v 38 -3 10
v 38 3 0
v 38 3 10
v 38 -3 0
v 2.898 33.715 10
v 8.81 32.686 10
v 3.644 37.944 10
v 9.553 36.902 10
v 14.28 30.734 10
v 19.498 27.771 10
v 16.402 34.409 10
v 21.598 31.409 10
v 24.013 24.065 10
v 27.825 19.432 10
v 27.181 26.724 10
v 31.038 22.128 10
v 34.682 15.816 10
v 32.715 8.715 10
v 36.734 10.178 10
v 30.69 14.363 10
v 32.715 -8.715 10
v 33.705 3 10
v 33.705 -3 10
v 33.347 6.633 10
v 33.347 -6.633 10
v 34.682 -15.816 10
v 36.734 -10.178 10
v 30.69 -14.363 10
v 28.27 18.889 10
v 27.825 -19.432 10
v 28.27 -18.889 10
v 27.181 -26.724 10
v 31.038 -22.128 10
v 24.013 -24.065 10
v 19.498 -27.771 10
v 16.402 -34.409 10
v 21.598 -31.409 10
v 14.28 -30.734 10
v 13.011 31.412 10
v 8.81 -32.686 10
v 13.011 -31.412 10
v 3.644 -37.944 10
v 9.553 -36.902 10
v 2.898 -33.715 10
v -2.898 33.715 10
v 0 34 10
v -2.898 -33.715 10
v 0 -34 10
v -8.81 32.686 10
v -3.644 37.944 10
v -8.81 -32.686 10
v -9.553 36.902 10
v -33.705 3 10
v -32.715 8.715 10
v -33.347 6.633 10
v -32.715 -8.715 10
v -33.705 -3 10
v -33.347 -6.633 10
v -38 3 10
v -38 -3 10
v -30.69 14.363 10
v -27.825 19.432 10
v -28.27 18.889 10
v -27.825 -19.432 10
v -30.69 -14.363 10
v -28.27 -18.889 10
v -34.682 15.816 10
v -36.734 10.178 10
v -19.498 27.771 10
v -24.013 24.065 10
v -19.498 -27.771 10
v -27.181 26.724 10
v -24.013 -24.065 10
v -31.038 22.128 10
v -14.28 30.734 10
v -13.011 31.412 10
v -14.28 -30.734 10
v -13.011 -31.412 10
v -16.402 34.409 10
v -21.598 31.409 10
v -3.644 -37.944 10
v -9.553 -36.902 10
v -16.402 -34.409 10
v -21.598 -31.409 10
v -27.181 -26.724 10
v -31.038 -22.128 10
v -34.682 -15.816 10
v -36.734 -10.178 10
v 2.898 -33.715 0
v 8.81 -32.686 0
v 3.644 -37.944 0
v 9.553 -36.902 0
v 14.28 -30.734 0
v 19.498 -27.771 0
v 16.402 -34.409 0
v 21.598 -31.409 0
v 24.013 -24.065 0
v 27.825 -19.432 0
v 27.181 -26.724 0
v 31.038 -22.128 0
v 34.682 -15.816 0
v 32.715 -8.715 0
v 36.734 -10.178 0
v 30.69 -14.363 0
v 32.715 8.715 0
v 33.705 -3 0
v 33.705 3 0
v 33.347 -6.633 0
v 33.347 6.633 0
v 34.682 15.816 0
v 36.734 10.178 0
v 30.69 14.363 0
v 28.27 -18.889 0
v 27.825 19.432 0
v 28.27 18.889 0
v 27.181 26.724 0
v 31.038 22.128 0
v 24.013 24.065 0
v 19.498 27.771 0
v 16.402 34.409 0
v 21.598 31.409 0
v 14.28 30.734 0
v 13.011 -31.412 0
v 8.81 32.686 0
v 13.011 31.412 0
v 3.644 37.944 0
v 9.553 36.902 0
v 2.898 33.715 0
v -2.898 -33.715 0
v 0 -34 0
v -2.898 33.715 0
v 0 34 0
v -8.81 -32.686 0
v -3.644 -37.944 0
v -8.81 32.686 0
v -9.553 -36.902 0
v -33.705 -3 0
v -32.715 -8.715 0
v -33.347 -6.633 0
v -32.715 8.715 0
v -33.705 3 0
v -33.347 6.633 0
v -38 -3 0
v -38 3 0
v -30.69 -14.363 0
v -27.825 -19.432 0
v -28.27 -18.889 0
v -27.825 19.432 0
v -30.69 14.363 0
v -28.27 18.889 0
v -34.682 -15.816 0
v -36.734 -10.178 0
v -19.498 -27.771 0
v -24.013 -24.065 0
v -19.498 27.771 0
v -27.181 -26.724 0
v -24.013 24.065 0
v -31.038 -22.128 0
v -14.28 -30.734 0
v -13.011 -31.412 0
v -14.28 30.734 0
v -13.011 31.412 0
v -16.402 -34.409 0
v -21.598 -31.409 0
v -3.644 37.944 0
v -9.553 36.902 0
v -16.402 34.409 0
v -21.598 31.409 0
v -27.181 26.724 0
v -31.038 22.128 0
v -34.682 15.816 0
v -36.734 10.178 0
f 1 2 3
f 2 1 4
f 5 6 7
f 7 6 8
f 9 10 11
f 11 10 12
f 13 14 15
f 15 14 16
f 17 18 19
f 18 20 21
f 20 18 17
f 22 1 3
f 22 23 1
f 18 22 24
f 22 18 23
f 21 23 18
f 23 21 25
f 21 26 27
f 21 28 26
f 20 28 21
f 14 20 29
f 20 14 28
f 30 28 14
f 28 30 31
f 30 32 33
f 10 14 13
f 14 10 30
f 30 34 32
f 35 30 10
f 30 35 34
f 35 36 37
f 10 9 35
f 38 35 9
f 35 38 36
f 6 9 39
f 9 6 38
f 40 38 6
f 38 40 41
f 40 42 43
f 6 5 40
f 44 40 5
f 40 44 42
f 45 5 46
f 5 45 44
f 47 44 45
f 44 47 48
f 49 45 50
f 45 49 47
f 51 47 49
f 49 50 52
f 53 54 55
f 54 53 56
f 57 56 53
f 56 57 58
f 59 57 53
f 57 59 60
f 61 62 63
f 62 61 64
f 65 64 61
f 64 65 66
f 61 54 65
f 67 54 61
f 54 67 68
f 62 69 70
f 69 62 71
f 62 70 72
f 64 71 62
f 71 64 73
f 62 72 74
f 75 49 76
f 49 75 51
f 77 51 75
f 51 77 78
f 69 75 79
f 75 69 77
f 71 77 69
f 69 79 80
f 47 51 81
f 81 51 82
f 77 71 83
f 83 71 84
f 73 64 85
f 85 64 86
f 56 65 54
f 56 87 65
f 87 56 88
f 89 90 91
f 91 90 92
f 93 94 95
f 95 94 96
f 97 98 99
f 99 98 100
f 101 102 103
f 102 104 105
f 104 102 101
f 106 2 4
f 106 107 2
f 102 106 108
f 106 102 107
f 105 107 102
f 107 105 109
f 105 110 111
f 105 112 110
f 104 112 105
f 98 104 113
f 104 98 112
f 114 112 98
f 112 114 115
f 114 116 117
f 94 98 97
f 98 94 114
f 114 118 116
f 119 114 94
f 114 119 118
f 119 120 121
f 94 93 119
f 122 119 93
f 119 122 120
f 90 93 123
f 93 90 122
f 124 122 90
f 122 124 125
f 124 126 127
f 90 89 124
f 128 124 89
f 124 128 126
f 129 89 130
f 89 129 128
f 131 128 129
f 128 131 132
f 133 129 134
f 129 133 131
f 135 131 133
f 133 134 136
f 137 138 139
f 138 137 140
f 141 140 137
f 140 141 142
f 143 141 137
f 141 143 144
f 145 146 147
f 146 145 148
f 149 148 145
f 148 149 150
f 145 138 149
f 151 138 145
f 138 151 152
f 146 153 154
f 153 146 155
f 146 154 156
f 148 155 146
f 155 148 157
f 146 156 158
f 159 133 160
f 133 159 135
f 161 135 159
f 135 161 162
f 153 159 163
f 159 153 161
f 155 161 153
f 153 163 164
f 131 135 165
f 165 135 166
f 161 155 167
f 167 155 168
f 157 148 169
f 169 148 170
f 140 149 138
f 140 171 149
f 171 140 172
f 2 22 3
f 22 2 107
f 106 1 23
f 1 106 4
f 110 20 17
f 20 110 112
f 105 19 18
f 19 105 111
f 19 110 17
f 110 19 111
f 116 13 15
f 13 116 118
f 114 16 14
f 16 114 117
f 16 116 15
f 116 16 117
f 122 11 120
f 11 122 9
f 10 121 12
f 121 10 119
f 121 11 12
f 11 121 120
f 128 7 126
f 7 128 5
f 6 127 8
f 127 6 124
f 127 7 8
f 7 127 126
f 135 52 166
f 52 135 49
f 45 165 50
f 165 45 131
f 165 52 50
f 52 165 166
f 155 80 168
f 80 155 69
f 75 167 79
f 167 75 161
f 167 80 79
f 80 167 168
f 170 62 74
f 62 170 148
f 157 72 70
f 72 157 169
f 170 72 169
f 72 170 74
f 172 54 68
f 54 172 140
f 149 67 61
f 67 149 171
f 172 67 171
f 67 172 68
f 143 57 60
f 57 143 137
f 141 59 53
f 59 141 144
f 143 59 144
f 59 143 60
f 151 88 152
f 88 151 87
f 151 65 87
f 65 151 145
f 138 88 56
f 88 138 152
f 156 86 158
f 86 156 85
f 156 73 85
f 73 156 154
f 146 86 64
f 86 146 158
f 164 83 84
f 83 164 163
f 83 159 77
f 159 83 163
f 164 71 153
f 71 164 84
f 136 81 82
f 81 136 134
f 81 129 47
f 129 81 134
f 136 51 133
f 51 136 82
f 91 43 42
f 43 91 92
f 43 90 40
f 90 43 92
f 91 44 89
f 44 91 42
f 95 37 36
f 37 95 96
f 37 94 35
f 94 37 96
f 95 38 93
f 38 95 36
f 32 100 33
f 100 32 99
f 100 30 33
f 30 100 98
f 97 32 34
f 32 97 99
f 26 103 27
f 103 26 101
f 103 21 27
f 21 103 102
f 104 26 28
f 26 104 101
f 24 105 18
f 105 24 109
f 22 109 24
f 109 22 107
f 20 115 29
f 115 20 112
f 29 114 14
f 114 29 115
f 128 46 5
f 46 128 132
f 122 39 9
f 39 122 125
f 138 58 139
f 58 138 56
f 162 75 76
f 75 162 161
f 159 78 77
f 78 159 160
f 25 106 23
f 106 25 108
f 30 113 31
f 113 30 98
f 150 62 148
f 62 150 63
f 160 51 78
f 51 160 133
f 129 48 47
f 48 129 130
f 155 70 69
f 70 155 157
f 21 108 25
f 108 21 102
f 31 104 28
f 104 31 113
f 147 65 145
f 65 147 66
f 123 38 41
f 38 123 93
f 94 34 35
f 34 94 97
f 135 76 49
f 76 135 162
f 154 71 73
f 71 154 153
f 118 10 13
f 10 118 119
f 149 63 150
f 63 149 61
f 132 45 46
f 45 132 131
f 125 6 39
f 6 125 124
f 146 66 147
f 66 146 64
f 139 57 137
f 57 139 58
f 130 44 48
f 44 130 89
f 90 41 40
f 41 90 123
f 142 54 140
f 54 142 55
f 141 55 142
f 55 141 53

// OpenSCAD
$fn = 32;

// ----------------------------------------------------------------------
// Spur blank: plain gear blank
// ----------------------------------------------------------------------

// --- parameters (mm) ---
disc_r = 34;              // blank root radius
disc_t = 10;              // blank thickness
n_teeth = 18;             // stub tooth count
tooth_w = 6;              // tooth width at the root
tooth_h = 4;              // tooth height above the root

out_r = disc_r + tooth_h;  // tip radius
bbox_x = 76.0;  // measured width over the teeth
bbox_y = 75.89;  // measured depth over the teeth

union() {
  cylinder(r = disc_r, h = disc_t);
  for (i = [0 : n_teeth - 1])
    rotate([0, 0, i * 360 / n_teeth])
      translate([disc_r - 1, -tooth_w / 2, 0])
        cube([tooth_h + 1, tooth_w, disc_t]);
}
